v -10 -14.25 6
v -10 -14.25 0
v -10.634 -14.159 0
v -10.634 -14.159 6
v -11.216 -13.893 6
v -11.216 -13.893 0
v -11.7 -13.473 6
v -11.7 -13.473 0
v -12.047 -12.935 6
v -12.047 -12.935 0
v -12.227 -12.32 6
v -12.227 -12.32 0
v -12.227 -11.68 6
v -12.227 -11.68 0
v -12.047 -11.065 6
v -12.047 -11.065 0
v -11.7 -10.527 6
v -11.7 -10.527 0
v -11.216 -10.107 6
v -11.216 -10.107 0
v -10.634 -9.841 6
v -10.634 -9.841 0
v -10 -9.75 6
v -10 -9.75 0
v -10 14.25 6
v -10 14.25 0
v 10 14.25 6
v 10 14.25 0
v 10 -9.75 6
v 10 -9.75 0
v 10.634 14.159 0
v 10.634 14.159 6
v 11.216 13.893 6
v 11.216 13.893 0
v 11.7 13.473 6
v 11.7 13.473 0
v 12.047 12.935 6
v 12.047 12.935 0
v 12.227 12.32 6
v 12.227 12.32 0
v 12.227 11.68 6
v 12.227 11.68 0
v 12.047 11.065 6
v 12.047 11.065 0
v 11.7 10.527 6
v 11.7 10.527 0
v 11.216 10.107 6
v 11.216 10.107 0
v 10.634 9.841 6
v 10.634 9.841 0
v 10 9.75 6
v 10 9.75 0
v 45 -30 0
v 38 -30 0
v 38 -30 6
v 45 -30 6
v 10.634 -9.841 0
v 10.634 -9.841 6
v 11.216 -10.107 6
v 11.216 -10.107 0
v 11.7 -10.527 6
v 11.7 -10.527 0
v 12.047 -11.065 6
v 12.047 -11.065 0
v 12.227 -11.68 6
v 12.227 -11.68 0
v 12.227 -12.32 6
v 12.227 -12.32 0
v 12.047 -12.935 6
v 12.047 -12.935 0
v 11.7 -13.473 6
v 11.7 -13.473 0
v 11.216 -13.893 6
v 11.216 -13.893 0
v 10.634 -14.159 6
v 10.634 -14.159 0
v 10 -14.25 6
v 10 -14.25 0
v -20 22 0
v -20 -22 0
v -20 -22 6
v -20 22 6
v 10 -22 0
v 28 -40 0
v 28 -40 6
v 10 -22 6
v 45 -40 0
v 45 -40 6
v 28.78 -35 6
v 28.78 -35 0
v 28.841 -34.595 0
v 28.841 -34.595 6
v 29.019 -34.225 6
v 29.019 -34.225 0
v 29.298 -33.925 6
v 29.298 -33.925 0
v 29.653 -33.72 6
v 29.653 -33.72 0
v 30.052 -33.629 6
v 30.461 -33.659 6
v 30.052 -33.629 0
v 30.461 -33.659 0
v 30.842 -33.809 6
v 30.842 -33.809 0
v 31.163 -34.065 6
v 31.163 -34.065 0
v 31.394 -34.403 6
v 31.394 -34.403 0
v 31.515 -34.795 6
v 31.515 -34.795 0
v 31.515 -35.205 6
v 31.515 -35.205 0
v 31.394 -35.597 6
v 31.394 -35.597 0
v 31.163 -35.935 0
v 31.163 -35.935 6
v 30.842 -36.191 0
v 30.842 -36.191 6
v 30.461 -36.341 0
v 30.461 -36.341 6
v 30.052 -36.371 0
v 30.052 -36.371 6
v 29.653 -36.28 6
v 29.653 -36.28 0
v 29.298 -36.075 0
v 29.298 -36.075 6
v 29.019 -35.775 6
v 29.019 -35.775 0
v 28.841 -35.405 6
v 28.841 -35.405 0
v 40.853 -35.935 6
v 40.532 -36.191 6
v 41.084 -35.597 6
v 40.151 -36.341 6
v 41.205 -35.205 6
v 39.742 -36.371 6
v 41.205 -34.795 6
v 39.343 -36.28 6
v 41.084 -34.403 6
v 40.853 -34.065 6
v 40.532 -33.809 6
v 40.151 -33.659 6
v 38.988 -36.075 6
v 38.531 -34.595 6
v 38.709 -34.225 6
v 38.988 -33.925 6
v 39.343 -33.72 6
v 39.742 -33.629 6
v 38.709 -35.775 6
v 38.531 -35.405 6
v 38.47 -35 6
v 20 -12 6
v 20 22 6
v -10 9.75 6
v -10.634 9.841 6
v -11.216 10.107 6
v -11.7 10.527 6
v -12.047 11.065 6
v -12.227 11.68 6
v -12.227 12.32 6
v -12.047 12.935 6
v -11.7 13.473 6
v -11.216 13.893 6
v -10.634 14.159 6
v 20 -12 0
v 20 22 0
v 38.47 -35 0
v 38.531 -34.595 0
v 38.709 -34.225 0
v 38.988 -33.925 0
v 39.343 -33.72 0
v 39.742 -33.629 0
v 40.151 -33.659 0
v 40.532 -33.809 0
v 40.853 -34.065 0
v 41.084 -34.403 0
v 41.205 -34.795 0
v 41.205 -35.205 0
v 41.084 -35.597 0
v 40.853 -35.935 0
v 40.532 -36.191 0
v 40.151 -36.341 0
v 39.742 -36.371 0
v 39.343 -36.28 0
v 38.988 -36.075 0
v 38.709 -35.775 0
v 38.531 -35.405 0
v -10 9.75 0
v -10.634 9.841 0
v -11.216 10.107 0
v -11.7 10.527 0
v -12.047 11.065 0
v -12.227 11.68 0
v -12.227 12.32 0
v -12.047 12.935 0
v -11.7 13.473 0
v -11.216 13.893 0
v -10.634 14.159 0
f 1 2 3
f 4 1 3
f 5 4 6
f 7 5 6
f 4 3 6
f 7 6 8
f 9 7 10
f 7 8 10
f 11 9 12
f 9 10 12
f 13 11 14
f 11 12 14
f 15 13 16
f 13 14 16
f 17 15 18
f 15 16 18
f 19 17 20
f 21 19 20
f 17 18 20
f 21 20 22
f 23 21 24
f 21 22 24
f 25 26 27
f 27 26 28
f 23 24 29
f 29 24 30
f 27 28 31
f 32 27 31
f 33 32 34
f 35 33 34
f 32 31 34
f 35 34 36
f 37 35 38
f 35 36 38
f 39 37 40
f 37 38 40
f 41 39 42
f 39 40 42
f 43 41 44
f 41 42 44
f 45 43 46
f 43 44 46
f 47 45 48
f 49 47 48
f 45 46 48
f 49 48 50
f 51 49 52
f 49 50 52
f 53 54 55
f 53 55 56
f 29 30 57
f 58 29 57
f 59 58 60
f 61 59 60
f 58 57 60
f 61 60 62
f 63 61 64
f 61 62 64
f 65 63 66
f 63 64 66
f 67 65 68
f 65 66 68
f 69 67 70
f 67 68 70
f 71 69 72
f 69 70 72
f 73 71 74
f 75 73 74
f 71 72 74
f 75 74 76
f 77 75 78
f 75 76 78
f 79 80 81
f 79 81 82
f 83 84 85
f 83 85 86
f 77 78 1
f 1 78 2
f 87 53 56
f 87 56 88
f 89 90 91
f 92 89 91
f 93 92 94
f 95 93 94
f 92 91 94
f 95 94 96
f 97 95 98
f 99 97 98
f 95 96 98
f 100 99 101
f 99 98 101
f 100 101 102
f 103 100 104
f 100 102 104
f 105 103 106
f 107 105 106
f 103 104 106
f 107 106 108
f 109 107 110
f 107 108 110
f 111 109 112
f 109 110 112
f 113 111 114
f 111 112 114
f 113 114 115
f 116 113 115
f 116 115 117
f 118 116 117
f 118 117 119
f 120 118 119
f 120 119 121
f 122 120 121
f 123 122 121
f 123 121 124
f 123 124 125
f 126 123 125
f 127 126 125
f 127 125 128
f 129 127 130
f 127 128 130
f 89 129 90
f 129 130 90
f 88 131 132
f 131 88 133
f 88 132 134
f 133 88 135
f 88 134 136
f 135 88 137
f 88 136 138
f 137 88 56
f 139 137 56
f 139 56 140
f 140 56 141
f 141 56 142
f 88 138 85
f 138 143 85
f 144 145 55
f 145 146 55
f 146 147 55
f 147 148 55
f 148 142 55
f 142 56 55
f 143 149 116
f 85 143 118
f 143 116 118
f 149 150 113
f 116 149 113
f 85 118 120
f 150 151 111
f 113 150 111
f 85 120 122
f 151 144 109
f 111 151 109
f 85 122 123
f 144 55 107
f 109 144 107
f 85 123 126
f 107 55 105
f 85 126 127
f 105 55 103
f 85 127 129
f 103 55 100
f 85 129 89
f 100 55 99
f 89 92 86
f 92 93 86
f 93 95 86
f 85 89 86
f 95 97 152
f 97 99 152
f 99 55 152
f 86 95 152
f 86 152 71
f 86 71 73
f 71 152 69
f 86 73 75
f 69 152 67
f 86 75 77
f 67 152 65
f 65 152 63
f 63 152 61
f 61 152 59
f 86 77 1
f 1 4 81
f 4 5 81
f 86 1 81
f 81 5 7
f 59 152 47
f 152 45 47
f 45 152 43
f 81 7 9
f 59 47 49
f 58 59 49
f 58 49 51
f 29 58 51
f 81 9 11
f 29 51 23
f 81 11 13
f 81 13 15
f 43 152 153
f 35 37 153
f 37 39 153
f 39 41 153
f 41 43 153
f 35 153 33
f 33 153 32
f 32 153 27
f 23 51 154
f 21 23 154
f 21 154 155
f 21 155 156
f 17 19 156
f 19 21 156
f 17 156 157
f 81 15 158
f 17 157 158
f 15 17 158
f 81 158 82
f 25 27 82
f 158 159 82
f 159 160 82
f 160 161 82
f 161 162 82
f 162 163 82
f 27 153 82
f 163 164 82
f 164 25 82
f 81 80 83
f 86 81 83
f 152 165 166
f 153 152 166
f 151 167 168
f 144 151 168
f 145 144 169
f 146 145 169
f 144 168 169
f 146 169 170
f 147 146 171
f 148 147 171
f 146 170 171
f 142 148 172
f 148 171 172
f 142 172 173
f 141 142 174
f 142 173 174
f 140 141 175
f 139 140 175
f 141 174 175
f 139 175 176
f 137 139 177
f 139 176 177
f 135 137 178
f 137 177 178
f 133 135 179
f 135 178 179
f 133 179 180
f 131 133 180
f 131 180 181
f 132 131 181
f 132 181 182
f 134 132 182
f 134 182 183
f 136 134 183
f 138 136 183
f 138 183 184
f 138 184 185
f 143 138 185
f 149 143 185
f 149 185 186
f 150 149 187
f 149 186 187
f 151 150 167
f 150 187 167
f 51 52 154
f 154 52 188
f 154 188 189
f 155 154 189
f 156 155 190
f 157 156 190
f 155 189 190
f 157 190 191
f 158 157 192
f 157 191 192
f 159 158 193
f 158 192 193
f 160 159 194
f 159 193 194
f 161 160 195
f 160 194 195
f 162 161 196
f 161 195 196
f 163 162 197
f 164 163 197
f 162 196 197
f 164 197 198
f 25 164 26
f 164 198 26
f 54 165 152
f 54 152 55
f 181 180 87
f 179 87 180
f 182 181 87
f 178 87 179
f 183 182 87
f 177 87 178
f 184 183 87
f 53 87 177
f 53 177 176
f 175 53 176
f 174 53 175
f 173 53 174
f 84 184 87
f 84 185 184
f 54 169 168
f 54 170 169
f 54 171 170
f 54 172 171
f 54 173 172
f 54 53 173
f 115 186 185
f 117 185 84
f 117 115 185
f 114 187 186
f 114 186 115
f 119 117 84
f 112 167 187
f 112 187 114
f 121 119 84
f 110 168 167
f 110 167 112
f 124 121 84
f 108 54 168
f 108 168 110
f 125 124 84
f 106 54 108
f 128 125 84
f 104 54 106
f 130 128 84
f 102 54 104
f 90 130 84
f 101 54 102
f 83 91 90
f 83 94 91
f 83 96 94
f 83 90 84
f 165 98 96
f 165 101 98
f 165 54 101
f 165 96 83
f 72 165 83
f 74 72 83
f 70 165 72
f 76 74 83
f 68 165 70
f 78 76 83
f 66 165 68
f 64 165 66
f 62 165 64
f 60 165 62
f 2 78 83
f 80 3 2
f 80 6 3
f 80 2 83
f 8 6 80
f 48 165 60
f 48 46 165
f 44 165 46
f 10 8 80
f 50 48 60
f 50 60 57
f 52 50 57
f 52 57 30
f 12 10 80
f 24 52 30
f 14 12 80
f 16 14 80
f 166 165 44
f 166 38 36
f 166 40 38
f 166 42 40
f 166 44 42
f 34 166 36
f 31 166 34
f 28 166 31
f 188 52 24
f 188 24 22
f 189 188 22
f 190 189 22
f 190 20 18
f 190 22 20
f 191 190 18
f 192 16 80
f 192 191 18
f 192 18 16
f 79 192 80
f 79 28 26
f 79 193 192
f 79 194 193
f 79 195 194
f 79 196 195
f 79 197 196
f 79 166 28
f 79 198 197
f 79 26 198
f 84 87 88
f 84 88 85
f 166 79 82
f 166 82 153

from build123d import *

# Parameters (mm, degrees)
SKETCH1_W           = 40
SKETCH1_H           = 44
BOSS_EXTRUDE1_DEPTH = 6
SKETCH3_R           = 1.375
BOSS_EXTRUDE2_DEPTH = 6


with BuildPart() as part:
    # Sketch1 → Boss-Extrude1 (new body)
    with BuildSketch(Plane.XY):
        Rectangle(SKETCH1_W, SKETCH1_H)
        with BuildLine():
            Line((-10, -9.75), (10, -9.75))
            ThreePointArc((10, -9.75), (12.25, -12), (10, -14.25))
            Line((10, -14.25), (-10, -14.25))
            ThreePointArc((-10, -14.25), (-12.25, -12), (-10, -9.75))
        make_face(mode=Mode.SUBTRACT)
        with BuildLine():
            Line((-10, 14.25), (10, 14.25))
            ThreePointArc((10, 14.25), (12.25, 12), (10, 9.75))
            Line((10, 9.75), (-10, 9.75))
            ThreePointArc((-10, 9.75), (-12.25, 12), (-10, 14.25))
        make_face(mode=Mode.SUBTRACT)
    extrude(amount=BOSS_EXTRUDE1_DEPTH)

    # Sketch3 → Boss-Extrude2 (add)
    with BuildSketch(Plane(origin=(0, 0, 0), x_dir=(-1, 0, 0), z_dir=(0, 0, -1))):
        Polygon((-20, -12), (-38, -30), (-45, -30), (-45, -40), (-28, -40), (-10, -22), (-20, -22), align=None)
        with Locations((-39.845, -35)):
            Circle(SKETCH3_R, mode=Mode.SUBTRACT)
        with Locations((-30.155, -35)):
            Circle(SKETCH3_R, mode=Mode.SUBTRACT)
    extrude(amount=-BOSS_EXTRUDE2_DEPTH)


solid = part.part
